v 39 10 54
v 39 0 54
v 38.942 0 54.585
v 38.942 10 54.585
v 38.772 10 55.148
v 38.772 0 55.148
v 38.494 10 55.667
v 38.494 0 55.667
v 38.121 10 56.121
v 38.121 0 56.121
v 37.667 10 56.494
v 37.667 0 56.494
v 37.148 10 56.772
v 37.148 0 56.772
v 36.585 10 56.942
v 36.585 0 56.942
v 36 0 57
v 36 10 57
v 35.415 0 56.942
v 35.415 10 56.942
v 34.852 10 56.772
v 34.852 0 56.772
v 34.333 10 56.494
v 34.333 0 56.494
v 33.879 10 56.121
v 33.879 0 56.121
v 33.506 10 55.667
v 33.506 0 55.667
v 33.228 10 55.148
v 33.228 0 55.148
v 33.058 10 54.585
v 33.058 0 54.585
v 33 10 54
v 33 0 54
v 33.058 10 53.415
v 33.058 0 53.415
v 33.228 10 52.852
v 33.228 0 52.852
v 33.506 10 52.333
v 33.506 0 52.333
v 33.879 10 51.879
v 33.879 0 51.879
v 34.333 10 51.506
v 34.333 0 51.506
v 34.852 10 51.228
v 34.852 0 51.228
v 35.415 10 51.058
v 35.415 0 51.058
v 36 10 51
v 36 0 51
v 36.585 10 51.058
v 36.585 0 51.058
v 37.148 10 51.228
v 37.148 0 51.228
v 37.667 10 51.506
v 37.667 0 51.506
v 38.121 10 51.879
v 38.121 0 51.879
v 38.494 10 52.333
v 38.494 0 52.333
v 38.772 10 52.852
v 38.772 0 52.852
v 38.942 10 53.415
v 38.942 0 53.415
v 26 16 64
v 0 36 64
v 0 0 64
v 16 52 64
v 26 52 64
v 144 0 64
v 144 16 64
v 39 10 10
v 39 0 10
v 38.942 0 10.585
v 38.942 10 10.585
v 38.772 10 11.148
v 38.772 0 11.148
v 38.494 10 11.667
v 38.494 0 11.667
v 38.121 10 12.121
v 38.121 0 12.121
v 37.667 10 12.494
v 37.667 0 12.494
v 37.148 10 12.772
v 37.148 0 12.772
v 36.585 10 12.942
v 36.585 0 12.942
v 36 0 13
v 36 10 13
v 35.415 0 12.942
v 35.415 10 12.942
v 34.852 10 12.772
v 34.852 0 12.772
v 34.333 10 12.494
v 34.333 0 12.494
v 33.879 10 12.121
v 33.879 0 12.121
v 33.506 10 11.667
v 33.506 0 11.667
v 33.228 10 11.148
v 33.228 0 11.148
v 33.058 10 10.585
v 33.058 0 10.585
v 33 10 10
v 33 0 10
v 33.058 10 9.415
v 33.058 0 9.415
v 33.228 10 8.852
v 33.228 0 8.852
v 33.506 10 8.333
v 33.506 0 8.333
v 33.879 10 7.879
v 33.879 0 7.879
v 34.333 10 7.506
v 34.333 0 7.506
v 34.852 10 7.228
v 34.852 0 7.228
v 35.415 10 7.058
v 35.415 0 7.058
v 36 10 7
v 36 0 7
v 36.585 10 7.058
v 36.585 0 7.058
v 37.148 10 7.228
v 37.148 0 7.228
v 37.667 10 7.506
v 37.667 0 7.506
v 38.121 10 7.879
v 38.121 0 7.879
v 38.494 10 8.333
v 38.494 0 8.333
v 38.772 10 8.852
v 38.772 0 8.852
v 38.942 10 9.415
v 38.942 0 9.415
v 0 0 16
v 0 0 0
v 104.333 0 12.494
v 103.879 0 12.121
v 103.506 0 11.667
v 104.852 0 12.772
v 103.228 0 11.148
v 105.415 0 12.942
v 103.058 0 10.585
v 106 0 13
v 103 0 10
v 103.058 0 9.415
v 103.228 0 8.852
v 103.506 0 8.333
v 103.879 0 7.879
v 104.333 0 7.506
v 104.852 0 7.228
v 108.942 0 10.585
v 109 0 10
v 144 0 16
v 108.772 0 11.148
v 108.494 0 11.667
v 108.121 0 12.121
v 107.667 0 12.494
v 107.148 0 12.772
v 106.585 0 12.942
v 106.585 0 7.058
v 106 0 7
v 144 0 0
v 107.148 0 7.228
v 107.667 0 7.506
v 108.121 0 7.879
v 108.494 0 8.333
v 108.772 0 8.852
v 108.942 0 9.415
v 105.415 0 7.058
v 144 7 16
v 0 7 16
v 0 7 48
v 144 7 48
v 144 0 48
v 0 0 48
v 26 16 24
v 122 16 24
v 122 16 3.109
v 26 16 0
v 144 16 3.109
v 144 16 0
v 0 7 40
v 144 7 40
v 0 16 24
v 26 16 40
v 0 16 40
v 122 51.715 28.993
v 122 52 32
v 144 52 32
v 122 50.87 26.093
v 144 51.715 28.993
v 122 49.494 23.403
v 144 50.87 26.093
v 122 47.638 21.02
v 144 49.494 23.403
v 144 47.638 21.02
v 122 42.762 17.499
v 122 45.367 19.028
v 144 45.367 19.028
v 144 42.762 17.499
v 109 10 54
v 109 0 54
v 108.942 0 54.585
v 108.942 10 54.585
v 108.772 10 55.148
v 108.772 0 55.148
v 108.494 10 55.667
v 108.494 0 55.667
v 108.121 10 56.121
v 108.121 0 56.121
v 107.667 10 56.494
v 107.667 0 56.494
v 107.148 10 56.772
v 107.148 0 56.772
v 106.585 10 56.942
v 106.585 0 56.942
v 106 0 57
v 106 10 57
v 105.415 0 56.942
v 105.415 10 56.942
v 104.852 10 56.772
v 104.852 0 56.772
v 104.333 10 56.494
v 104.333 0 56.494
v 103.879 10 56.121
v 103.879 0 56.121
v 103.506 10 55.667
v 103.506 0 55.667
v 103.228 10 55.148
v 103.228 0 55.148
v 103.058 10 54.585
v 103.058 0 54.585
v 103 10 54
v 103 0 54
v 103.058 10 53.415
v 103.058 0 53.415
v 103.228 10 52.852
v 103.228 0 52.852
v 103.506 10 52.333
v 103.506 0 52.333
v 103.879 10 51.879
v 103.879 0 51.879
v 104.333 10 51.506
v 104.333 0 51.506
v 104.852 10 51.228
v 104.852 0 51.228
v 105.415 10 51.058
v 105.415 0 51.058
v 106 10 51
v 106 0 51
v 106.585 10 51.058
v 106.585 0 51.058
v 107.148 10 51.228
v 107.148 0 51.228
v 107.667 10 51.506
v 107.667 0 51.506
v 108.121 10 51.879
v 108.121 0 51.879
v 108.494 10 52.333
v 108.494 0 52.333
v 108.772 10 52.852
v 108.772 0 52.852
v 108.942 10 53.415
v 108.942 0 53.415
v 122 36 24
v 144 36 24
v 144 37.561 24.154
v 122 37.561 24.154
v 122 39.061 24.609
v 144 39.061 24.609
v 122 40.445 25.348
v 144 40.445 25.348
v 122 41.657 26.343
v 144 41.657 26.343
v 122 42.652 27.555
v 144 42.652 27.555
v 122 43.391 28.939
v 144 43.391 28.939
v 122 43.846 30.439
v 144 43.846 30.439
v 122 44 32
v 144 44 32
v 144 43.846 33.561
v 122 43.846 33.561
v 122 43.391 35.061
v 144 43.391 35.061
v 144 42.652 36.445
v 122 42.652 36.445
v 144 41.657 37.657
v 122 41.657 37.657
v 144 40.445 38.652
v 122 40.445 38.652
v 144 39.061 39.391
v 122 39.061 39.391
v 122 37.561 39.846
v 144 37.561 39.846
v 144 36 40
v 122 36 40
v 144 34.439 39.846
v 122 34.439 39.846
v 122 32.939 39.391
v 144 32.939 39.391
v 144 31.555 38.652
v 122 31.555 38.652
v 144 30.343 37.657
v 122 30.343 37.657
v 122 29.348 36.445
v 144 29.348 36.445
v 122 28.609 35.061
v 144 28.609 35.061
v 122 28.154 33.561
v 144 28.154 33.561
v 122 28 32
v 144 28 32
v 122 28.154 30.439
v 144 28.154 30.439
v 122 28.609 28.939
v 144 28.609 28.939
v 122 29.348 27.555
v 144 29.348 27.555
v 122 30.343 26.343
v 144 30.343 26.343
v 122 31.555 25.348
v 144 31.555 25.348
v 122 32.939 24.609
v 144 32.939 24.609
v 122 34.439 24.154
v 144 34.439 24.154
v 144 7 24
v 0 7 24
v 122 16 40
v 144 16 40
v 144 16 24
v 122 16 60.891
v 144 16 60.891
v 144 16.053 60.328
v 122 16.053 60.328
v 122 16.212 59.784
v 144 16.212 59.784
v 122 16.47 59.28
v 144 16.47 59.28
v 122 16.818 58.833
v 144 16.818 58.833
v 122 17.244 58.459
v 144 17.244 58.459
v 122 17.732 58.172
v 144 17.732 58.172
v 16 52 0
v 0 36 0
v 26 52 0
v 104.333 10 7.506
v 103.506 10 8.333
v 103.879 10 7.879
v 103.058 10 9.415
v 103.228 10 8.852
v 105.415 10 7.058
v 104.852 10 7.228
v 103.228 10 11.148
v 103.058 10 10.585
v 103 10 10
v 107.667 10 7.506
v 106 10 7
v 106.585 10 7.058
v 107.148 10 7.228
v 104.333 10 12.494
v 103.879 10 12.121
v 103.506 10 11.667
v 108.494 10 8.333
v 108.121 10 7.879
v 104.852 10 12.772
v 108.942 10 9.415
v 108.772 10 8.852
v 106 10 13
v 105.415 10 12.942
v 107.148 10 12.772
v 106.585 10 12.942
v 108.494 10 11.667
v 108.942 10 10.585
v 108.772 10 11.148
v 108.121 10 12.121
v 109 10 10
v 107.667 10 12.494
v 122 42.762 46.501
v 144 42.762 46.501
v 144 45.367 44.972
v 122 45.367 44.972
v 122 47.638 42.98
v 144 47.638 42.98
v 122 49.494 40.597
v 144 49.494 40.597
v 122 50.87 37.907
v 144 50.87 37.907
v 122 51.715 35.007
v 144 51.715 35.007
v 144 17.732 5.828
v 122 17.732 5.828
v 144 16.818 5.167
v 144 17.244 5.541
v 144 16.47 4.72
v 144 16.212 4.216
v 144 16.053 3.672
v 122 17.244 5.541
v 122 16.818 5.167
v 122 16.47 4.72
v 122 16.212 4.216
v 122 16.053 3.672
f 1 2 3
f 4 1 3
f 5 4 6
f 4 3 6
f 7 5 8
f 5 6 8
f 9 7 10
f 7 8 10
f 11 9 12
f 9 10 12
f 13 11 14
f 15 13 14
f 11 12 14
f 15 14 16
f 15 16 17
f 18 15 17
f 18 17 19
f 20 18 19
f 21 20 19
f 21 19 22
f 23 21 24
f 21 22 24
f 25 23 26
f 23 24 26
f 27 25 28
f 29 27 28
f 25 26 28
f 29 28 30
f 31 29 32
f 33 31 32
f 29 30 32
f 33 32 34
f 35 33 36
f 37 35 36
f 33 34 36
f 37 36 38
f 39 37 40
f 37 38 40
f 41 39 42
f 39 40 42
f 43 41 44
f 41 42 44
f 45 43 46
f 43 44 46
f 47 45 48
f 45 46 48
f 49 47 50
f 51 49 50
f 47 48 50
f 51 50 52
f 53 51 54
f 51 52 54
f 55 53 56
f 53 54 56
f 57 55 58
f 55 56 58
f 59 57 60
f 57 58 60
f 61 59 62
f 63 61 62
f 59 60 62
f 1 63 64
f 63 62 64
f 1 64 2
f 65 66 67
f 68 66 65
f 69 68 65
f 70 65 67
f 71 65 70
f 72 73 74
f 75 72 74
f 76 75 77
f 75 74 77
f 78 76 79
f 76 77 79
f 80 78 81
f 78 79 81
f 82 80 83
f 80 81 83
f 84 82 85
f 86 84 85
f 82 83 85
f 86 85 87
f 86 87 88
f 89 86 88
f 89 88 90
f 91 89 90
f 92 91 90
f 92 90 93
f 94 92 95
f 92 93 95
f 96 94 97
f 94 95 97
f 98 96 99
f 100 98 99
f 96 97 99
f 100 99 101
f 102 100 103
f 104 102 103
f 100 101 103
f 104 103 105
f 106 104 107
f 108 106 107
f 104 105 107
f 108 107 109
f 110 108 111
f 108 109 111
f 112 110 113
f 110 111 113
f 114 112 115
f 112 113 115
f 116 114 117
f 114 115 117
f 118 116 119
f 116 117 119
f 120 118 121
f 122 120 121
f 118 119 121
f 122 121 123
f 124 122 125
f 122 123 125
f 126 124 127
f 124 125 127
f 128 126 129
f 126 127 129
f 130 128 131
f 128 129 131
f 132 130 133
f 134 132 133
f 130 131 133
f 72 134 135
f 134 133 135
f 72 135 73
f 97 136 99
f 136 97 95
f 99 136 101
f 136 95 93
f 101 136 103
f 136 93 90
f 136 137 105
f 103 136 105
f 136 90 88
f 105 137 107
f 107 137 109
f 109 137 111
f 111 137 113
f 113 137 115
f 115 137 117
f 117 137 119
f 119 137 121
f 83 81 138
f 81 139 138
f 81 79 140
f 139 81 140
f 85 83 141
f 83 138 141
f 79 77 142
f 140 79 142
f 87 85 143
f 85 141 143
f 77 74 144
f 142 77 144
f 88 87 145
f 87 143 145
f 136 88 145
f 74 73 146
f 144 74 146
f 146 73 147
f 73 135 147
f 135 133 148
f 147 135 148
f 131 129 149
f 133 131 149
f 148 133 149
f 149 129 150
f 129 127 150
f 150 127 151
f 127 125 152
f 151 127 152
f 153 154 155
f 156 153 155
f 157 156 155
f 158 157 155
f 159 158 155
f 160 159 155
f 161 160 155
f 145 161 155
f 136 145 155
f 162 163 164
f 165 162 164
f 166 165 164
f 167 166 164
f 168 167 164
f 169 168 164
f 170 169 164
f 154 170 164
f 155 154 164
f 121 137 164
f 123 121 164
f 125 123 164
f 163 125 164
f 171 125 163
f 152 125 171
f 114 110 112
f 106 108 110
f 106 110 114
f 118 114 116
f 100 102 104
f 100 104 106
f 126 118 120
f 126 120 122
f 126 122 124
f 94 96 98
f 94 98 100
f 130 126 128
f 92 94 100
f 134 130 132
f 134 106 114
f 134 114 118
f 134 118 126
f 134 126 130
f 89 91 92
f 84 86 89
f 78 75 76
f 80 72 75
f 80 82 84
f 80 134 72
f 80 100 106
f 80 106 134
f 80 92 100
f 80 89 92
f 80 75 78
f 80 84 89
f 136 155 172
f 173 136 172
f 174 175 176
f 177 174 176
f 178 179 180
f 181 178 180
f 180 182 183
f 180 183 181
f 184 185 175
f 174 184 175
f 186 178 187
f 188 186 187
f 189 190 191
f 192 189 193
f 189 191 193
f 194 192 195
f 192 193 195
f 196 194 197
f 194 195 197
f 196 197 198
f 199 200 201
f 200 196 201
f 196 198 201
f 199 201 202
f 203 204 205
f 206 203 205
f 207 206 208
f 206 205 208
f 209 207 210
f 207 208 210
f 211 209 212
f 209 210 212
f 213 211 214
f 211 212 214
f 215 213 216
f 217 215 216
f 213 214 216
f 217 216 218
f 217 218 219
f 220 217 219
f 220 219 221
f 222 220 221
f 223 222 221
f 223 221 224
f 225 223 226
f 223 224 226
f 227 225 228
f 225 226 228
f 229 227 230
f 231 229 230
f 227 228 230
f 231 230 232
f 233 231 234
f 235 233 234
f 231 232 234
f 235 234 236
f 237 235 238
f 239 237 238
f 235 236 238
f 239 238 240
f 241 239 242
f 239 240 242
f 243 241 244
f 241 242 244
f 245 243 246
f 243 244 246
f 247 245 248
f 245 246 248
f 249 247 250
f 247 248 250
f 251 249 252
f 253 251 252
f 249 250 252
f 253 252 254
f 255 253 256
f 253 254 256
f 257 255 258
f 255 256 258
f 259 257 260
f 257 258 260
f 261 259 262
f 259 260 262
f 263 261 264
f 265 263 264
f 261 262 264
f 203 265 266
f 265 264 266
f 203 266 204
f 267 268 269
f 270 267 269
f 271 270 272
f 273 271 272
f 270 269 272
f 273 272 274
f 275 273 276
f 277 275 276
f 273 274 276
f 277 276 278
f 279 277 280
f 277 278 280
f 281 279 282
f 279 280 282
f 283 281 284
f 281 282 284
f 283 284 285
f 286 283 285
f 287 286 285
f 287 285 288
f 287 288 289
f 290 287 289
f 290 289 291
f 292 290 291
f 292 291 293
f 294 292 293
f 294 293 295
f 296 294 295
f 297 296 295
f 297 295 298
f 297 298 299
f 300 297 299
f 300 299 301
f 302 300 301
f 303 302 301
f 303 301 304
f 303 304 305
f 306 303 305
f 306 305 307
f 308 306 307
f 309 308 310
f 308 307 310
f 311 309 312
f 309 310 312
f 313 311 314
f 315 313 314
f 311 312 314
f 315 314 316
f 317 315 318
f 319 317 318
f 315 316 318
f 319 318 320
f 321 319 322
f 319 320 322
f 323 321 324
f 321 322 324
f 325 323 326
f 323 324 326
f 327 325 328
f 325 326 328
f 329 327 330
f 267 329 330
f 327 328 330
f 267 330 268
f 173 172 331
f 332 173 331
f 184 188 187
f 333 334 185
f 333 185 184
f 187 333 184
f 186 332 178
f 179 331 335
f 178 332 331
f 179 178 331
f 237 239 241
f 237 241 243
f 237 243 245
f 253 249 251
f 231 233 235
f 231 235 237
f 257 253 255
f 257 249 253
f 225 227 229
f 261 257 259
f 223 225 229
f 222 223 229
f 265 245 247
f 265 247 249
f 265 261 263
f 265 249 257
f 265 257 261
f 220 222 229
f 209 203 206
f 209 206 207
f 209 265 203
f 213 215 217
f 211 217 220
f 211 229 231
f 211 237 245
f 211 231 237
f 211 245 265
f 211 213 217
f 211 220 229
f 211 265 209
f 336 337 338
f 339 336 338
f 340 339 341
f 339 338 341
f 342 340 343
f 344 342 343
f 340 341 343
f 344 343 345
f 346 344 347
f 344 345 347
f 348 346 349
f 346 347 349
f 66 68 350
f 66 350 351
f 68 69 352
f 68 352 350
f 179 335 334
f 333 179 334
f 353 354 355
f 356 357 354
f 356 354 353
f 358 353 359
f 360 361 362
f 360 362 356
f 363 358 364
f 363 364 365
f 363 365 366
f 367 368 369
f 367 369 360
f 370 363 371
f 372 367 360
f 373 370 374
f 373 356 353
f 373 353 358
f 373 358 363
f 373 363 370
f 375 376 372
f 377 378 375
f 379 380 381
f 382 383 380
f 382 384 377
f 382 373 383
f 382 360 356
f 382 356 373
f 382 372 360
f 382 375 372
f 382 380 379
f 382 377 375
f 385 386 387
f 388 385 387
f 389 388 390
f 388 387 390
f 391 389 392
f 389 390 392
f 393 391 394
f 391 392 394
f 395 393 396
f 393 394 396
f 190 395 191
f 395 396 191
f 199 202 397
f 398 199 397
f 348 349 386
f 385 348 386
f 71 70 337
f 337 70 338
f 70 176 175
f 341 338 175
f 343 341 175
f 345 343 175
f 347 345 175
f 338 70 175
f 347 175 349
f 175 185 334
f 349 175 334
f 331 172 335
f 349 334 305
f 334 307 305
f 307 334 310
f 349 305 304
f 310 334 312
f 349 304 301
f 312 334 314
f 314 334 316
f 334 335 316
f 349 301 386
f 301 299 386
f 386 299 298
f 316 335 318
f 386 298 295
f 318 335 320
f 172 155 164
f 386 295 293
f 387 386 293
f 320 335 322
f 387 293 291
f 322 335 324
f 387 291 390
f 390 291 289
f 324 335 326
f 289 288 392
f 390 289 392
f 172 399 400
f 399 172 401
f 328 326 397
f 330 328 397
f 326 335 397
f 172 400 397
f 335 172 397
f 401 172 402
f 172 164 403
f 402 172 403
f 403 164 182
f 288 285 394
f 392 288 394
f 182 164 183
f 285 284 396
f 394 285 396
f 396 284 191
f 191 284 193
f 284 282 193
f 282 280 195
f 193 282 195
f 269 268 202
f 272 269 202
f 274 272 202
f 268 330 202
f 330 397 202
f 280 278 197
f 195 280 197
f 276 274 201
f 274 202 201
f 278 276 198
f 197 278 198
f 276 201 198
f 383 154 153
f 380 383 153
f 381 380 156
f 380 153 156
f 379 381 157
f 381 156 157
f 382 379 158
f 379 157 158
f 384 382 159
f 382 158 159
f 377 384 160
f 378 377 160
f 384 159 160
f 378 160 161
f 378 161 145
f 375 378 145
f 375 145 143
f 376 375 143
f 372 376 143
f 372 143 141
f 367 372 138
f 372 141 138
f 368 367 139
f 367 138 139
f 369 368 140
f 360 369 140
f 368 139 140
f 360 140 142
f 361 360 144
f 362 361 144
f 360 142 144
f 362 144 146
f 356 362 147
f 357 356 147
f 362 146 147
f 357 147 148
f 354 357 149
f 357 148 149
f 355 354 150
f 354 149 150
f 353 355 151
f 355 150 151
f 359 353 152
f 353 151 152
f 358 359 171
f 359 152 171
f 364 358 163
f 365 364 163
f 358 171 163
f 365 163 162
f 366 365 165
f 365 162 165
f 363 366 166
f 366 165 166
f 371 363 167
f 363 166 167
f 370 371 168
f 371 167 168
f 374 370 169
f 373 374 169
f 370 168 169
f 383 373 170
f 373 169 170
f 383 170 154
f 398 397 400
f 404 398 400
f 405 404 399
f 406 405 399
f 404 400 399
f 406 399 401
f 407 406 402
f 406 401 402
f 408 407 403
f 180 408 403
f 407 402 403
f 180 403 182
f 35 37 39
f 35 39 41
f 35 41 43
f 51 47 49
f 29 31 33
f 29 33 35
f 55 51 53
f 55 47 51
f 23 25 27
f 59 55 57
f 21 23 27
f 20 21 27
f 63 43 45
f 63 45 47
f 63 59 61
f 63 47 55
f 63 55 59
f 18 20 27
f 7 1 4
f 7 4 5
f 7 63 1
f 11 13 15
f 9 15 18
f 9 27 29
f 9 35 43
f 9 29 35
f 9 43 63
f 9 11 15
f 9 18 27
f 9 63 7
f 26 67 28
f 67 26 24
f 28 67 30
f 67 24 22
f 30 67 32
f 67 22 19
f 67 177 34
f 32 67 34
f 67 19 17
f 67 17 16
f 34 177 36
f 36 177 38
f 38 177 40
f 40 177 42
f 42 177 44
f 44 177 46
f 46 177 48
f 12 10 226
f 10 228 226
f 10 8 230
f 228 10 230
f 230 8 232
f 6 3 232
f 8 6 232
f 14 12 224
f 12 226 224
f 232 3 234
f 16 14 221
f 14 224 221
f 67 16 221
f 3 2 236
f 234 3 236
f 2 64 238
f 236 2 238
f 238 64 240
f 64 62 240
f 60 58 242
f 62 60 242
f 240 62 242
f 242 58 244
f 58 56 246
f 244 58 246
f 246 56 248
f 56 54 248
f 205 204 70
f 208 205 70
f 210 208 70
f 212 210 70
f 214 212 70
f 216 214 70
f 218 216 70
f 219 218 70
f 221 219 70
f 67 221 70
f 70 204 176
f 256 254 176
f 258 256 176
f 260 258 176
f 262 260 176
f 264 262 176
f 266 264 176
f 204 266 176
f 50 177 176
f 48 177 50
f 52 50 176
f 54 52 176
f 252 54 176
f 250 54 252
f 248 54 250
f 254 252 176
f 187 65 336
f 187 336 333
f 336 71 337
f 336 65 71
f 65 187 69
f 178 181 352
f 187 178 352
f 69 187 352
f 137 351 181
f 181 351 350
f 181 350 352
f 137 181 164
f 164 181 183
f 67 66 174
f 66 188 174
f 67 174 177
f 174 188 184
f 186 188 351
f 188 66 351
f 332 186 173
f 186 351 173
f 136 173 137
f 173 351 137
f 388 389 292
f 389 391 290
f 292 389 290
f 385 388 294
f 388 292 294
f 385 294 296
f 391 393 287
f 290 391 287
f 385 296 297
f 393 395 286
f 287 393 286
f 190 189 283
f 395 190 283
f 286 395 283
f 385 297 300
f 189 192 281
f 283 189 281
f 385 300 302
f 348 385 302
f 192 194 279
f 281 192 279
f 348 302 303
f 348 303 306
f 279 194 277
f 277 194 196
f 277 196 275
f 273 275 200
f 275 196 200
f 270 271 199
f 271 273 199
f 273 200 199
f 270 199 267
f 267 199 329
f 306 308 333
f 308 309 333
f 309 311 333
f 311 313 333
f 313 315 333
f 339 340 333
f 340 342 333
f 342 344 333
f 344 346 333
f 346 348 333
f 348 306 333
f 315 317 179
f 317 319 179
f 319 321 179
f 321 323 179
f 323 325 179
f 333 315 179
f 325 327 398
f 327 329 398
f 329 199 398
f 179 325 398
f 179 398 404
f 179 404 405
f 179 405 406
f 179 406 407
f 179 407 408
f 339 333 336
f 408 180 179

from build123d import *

# Parameters (mm, degrees)
BOSS_EXTRUDE1_DEPTH = 64
SKETCH2_R           = 8
CUT_EXTRUDE1_DEPTH  = 64
CUT_EXTRUDE2_REACH  = 146
SKETCH4_R           = 3
CUT_EXTRUDE3_DEPTH  = 10


with BuildPart() as part:
    # Sketch1 → Boss-Extrude1 (new body)
    with BuildSketch(Plane.XY):
        Polygon((0, 0), (144, 0), (144, 52), (122, 52), (122, 16), (26, 16), (26, 52), (16, 52), (0, 36), align=None)
    extrude(amount=BOSS_EXTRUDE1_DEPTH)

    # Sketch2 → Cut-Extrude1 (cut)
    with BuildSketch(Plane(origin=(144, 0, 0), x_dir=(0, 0, -1), z_dir=(1, 0, 0))):
        with BuildLine():
            Line((-64, 52), (-64, 16))
            Line((-64, 16), (-60.891410649, 16))
            ThreePointArc((-60.891410649, 16), (-59.279511824, 16.469825663), (-58.172487288, 17.732145215))
            Line((-58.172487288, 17.732145215), (-46.500924593, 42.761892188))
            ThreePointArc((-46.500924593, 42.761892188), (-40.596793734, 49.494263133), (-32, 52))
            Line((-32, 52), (-64, 52))
        make_face()
        with BuildLine():
            Line((0, 52), (-32, 52))
            ThreePointArc((-32, 52), (-23.403206266, 49.494263133), (-17.499075407, 42.761892188))
            Line((-17.499075407, 42.761892188), (-5.827512712, 17.732145215))
            ThreePointArc((-5.827512712, 17.732145215), (-4.720488176, 16.469825663), (-3.108589351, 16))
            Line((-3.108589351, 16), (0, 16))
            Line((0, 16), (0, 52))
        make_face()
        with Locations((-32, 36)):
            Circle(SKETCH2_R)
    extrude(amount=-CUT_EXTRUDE1_DEPTH, mode=Mode.SUBTRACT)

    # Sketch3 → Cut-Extrude2 (cut, up to next)
    with BuildSketch(Plane(origin=(144, 0, 0), x_dir=(0, 0, -1), z_dir=(1, 0, 0)), mode=Mode.PRIVATE) as cut_extrude2_sk1:
        Polygon((-48, 0), (-16, 0), (-16, 7), (-24, 7), (-24, 16), (-40, 16), (-40, 7), (-48, 7), align=None)
    cut_extrude2_tool1 = extrude(cut_extrude2_sk1.sketch, amount=-CUT_EXTRUDE2_REACH, mode=Mode.PRIVATE) & part.part
    add(cut_extrude2_tool1.solids().sort_by_distance((144, 6.630435, 32))[0], mode=Mode.SUBTRACT)

    # Sketch4 → Cut-Extrude3 (cut)
    with BuildSketch(Plane.XZ):
        with Locations((36, 54)):
            Circle(SKETCH4_R)
        with Locations((106, 54)):
            Circle(SKETCH4_R)
        with Locations((36, 10)):
            Circle(SKETCH4_R)
        with Locations((106, 10)):
            Circle(SKETCH4_R)
    extrude(amount=-CUT_EXTRUDE3_DEPTH, mode=Mode.SUBTRACT)


solid = part.part
